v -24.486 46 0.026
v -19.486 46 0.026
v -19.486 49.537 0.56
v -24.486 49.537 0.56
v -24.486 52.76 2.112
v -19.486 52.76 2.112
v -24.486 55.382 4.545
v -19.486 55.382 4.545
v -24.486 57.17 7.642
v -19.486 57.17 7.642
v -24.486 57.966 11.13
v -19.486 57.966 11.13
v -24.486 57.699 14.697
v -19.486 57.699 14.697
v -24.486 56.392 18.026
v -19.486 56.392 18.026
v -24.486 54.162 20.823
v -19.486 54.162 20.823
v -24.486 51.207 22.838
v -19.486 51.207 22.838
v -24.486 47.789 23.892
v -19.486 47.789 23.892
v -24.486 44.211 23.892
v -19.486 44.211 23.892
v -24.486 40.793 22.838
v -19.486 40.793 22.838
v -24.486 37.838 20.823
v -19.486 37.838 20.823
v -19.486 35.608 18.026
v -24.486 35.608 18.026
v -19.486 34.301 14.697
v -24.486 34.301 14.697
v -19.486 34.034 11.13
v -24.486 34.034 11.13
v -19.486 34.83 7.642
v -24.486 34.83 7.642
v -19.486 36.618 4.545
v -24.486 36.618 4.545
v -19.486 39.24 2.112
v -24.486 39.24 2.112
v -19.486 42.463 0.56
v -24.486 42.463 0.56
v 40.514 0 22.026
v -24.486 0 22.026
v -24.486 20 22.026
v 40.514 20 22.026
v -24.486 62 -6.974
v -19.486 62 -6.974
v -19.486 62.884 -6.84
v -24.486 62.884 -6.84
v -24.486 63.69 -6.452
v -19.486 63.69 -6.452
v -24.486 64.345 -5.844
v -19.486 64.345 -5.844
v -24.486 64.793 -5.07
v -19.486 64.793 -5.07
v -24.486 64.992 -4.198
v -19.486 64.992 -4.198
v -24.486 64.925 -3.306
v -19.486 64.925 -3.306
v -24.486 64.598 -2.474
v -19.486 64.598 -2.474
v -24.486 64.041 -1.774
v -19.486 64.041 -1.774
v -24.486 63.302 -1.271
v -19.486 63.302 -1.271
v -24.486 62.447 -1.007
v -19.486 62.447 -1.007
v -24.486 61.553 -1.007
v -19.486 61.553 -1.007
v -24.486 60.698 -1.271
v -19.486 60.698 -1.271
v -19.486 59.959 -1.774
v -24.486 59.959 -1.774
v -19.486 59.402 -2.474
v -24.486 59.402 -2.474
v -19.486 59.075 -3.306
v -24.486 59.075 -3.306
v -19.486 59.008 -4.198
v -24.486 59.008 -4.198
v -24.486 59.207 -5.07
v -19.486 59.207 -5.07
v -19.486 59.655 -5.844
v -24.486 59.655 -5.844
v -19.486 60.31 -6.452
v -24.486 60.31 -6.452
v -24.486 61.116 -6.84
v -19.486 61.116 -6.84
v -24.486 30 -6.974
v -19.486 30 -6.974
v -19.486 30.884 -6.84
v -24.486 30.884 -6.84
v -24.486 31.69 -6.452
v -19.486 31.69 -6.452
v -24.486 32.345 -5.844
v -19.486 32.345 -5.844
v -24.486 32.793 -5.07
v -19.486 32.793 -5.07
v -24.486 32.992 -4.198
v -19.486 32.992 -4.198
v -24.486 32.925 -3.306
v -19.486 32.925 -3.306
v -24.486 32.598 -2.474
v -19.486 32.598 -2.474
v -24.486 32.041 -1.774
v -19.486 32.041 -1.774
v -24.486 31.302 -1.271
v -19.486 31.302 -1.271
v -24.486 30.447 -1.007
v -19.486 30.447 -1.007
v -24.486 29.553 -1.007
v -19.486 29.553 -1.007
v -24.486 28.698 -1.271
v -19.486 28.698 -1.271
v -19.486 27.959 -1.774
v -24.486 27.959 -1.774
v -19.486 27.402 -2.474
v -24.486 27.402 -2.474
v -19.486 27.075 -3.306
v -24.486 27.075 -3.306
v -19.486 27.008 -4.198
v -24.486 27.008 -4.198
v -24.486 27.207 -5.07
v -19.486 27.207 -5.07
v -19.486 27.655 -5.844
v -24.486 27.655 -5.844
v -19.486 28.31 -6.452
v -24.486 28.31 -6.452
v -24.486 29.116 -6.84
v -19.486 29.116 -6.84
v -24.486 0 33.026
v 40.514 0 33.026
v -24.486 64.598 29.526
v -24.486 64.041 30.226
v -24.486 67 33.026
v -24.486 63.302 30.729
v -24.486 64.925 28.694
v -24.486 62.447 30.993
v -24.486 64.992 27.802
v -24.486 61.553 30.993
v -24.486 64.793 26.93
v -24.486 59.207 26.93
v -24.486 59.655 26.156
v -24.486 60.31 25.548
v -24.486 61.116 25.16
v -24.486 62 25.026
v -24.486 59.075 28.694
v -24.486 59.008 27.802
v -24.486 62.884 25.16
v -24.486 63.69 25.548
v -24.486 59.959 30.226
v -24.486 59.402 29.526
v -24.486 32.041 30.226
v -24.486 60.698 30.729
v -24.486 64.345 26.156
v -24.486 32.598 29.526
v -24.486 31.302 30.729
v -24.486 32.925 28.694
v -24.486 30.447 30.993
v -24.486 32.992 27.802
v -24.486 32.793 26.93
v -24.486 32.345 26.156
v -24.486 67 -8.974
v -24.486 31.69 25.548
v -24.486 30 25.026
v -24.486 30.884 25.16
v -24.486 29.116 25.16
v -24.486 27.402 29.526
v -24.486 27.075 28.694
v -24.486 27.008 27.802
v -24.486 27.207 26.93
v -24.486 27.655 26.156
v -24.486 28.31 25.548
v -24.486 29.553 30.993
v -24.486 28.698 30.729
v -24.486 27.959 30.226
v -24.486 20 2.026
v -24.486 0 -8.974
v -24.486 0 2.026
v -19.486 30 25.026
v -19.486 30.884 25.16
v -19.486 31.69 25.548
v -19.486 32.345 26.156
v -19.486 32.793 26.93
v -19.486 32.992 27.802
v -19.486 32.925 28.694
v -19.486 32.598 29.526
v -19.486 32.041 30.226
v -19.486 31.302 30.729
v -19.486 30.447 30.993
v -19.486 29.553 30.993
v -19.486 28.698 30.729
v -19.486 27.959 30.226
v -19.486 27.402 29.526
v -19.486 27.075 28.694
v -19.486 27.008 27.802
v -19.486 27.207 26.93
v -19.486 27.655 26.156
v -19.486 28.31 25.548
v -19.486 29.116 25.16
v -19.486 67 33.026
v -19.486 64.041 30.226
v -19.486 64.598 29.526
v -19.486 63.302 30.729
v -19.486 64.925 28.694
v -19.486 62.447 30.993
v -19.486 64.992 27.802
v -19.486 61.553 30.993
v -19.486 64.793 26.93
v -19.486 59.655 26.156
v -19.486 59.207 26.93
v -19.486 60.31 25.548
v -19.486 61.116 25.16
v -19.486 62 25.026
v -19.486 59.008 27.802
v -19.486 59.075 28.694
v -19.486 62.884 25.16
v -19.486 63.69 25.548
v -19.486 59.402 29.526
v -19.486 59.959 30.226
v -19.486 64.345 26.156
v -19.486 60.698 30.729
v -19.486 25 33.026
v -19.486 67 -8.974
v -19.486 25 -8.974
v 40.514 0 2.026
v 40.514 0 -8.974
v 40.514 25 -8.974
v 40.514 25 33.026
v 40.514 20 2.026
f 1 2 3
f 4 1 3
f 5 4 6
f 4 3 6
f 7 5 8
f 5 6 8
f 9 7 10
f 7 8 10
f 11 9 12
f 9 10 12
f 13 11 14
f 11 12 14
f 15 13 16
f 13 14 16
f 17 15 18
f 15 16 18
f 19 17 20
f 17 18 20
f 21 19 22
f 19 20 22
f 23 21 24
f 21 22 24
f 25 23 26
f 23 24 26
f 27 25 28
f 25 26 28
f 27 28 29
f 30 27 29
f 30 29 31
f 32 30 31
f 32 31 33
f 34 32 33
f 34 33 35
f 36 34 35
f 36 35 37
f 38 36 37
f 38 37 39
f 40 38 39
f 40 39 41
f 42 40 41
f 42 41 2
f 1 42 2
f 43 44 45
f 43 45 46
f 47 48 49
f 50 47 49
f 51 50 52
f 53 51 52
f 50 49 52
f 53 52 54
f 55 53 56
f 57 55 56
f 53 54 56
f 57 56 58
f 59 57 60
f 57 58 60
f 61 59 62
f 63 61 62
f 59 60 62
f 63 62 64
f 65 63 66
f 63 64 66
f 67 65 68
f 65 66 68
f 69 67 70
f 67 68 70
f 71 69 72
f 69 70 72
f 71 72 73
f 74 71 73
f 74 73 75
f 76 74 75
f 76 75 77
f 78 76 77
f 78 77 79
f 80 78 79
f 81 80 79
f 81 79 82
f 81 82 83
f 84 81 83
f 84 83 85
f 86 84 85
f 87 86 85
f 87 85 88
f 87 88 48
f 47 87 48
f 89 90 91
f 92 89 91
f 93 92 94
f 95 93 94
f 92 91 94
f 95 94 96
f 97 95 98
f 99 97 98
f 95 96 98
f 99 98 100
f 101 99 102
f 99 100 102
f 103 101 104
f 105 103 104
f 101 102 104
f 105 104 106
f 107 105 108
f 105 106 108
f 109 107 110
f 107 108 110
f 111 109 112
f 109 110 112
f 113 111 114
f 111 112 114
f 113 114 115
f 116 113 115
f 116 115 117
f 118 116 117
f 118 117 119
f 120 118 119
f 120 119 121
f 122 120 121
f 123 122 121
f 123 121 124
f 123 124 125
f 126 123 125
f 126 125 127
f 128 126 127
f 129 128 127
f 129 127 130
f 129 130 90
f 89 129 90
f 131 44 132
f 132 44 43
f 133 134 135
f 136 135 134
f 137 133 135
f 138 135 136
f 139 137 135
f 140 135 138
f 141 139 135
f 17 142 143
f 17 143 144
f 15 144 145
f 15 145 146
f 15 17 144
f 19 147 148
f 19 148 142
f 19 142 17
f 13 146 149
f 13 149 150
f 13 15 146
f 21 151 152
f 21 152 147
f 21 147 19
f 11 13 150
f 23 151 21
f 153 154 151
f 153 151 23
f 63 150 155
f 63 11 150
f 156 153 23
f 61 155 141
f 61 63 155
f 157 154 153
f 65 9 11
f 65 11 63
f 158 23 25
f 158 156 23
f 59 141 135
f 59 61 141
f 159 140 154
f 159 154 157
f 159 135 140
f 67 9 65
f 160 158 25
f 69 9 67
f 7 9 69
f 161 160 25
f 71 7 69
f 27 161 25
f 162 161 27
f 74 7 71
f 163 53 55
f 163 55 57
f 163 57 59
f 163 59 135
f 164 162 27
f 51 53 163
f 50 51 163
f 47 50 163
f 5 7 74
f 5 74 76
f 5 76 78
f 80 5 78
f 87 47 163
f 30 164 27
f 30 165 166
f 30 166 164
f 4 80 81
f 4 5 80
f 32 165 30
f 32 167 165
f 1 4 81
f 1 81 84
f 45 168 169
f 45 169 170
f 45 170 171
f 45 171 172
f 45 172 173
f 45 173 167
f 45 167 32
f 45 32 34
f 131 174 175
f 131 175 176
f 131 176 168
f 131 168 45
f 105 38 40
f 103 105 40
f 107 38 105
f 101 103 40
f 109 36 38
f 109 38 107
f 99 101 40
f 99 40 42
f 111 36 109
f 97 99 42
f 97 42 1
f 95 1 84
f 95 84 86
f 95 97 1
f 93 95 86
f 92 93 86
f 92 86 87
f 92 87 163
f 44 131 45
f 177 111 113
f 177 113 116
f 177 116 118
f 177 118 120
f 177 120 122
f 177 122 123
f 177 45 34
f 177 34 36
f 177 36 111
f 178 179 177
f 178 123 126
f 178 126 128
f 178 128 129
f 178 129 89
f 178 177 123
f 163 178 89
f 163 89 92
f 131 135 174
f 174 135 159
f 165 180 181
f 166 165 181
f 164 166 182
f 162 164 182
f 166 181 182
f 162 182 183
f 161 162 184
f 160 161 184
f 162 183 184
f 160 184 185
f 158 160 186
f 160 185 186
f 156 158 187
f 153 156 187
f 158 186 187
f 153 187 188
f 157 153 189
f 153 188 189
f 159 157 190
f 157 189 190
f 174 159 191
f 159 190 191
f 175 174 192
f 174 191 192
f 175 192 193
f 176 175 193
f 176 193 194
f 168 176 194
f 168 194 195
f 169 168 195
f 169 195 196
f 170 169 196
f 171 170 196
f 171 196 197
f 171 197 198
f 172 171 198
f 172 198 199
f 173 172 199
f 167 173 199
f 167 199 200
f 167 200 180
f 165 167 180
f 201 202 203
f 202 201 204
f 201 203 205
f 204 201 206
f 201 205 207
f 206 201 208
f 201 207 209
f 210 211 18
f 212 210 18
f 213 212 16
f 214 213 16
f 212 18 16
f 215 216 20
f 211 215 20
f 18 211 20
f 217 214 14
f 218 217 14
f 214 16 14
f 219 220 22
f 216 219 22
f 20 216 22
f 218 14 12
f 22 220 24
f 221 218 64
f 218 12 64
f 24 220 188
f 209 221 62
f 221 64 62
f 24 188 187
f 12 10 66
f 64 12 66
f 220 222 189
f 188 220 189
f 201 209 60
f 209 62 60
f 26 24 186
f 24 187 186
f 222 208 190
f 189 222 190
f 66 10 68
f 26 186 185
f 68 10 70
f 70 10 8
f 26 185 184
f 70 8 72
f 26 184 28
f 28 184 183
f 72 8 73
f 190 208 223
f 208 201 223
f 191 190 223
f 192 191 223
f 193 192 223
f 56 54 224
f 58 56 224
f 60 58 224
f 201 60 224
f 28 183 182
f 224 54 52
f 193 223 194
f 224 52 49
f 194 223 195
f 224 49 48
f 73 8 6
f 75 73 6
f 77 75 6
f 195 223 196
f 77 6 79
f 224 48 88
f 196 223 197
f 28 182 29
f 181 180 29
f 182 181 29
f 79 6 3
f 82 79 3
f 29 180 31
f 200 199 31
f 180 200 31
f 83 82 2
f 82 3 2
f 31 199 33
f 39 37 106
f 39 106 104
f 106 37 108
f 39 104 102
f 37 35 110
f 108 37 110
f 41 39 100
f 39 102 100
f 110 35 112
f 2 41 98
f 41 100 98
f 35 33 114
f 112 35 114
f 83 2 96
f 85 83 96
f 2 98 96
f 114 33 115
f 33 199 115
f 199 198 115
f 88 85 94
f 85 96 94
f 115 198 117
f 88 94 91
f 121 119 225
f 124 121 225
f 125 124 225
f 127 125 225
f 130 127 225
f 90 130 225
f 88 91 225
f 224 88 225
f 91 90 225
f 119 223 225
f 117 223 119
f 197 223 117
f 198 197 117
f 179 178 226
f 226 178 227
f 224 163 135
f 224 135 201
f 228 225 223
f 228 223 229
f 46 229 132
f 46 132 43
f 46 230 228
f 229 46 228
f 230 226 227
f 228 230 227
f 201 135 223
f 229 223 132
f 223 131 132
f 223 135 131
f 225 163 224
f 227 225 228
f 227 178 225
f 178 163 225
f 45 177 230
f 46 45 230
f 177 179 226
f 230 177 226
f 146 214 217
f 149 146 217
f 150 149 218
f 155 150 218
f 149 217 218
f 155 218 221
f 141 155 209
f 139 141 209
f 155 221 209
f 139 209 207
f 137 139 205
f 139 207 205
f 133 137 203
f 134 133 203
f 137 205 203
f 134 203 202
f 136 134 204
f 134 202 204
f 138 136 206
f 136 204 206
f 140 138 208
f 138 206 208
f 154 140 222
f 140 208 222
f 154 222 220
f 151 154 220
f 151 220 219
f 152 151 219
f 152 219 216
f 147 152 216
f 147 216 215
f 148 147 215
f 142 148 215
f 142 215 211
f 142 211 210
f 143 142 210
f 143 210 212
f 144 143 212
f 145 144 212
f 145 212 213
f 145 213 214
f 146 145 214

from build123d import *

# Parameters (mm, degrees)
SKETCH_1_W          = 65
SKETCH_1_H          = 11
EXTRUDE_1_DEPTH     = 20
EXTRUDE_1_2_DEPTH   = 20
SKETCH_2_W          = 65
SKETCH_2_H          = 42
EXTRUDE_2_DEPTH     = 5
SKETCH_3_W          = 5
SKETCH_3_H          = 42
EXTRUDE_3_DEPTH     = 42
SKETCH_5_R          = 12
SKETCH_5_R_2        = 3
CUT_EXTRUDE_3_DEPTH = 42


with BuildPart() as part:
    # 草图1 → 凸台-拉伸1 (new body)
    with BuildSketch(Plane(origin=(0, 0, 0), x_dir=(1, 0, 0), z_dir=(0, 1, 0))):
        with Locations((8.014018692, 3.47352182)):
            Rectangle(SKETCH_1_W, SKETCH_1_H)
    extrude(amount=EXTRUDE_1_DEPTH)



with BuildPart() as body_2:
    # 草图1 → Extrude 1 2 (new body)
    with BuildSketch(Plane(origin=(0, 0, 0), x_dir=(1, 0, 0), z_dir=(0, 1, 0))):
        with Locations((8.014018692, -27.52647818)):
            Rectangle(SKETCH_1_W, SKETCH_1_H)
    extrude(amount=EXTRUDE_1_2_DEPTH)


with BuildPart() as part_1:
    add(part.part)

    add(body_2.part)  # 凸台-拉伸2 merges body 2
    # 草图2 → 凸台-拉伸2 (add)
    with BuildSketch(Plane(origin=(0, 20, 0), x_dir=(1, 0, 0), z_dir=(0, 1, 0))):
        with Locations((8.014018692, -12.02647818)):
            Rectangle(SKETCH_2_W, SKETCH_2_H)
    extrude(amount=EXTRUDE_2_DEPTH)

    # 草图3 → 凸台-拉伸3 (add)
    with BuildSketch(Plane(origin=(0, 25, 0), x_dir=(1, 0, 0), z_dir=(0, 1, 0))):
        with Locations((-21.985981308, -12.02647818)):
            Rectangle(SKETCH_3_W, SKETCH_3_H)
    extrude(amount=EXTRUDE_3_DEPTH)

    # 草图5 → 切除-拉伸3 (cut)
    with BuildSketch(Plane(origin=(-19.485981308, 0, 0), x_dir=(0, 0, -1), z_dir=(1, 0, 0))):
        with Locations((-12.02647818, 46)):
            Circle(SKETCH_5_R)
        with Locations((-28.02647818, 62)):
            Circle(SKETCH_5_R_2)
        with Locations((3.97352182, 62)):
            Circle(SKETCH_5_R_2)
        with Locations((3.97352182, 30)):
            Circle(SKETCH_5_R_2)
        with Locations((-28.02647818, 30)):
            Circle(SKETCH_5_R_2)
    extrude(amount=-CUT_EXTRUDE_3_DEPTH, mode=Mode.SUBTRACT)


solid = part_1.part
